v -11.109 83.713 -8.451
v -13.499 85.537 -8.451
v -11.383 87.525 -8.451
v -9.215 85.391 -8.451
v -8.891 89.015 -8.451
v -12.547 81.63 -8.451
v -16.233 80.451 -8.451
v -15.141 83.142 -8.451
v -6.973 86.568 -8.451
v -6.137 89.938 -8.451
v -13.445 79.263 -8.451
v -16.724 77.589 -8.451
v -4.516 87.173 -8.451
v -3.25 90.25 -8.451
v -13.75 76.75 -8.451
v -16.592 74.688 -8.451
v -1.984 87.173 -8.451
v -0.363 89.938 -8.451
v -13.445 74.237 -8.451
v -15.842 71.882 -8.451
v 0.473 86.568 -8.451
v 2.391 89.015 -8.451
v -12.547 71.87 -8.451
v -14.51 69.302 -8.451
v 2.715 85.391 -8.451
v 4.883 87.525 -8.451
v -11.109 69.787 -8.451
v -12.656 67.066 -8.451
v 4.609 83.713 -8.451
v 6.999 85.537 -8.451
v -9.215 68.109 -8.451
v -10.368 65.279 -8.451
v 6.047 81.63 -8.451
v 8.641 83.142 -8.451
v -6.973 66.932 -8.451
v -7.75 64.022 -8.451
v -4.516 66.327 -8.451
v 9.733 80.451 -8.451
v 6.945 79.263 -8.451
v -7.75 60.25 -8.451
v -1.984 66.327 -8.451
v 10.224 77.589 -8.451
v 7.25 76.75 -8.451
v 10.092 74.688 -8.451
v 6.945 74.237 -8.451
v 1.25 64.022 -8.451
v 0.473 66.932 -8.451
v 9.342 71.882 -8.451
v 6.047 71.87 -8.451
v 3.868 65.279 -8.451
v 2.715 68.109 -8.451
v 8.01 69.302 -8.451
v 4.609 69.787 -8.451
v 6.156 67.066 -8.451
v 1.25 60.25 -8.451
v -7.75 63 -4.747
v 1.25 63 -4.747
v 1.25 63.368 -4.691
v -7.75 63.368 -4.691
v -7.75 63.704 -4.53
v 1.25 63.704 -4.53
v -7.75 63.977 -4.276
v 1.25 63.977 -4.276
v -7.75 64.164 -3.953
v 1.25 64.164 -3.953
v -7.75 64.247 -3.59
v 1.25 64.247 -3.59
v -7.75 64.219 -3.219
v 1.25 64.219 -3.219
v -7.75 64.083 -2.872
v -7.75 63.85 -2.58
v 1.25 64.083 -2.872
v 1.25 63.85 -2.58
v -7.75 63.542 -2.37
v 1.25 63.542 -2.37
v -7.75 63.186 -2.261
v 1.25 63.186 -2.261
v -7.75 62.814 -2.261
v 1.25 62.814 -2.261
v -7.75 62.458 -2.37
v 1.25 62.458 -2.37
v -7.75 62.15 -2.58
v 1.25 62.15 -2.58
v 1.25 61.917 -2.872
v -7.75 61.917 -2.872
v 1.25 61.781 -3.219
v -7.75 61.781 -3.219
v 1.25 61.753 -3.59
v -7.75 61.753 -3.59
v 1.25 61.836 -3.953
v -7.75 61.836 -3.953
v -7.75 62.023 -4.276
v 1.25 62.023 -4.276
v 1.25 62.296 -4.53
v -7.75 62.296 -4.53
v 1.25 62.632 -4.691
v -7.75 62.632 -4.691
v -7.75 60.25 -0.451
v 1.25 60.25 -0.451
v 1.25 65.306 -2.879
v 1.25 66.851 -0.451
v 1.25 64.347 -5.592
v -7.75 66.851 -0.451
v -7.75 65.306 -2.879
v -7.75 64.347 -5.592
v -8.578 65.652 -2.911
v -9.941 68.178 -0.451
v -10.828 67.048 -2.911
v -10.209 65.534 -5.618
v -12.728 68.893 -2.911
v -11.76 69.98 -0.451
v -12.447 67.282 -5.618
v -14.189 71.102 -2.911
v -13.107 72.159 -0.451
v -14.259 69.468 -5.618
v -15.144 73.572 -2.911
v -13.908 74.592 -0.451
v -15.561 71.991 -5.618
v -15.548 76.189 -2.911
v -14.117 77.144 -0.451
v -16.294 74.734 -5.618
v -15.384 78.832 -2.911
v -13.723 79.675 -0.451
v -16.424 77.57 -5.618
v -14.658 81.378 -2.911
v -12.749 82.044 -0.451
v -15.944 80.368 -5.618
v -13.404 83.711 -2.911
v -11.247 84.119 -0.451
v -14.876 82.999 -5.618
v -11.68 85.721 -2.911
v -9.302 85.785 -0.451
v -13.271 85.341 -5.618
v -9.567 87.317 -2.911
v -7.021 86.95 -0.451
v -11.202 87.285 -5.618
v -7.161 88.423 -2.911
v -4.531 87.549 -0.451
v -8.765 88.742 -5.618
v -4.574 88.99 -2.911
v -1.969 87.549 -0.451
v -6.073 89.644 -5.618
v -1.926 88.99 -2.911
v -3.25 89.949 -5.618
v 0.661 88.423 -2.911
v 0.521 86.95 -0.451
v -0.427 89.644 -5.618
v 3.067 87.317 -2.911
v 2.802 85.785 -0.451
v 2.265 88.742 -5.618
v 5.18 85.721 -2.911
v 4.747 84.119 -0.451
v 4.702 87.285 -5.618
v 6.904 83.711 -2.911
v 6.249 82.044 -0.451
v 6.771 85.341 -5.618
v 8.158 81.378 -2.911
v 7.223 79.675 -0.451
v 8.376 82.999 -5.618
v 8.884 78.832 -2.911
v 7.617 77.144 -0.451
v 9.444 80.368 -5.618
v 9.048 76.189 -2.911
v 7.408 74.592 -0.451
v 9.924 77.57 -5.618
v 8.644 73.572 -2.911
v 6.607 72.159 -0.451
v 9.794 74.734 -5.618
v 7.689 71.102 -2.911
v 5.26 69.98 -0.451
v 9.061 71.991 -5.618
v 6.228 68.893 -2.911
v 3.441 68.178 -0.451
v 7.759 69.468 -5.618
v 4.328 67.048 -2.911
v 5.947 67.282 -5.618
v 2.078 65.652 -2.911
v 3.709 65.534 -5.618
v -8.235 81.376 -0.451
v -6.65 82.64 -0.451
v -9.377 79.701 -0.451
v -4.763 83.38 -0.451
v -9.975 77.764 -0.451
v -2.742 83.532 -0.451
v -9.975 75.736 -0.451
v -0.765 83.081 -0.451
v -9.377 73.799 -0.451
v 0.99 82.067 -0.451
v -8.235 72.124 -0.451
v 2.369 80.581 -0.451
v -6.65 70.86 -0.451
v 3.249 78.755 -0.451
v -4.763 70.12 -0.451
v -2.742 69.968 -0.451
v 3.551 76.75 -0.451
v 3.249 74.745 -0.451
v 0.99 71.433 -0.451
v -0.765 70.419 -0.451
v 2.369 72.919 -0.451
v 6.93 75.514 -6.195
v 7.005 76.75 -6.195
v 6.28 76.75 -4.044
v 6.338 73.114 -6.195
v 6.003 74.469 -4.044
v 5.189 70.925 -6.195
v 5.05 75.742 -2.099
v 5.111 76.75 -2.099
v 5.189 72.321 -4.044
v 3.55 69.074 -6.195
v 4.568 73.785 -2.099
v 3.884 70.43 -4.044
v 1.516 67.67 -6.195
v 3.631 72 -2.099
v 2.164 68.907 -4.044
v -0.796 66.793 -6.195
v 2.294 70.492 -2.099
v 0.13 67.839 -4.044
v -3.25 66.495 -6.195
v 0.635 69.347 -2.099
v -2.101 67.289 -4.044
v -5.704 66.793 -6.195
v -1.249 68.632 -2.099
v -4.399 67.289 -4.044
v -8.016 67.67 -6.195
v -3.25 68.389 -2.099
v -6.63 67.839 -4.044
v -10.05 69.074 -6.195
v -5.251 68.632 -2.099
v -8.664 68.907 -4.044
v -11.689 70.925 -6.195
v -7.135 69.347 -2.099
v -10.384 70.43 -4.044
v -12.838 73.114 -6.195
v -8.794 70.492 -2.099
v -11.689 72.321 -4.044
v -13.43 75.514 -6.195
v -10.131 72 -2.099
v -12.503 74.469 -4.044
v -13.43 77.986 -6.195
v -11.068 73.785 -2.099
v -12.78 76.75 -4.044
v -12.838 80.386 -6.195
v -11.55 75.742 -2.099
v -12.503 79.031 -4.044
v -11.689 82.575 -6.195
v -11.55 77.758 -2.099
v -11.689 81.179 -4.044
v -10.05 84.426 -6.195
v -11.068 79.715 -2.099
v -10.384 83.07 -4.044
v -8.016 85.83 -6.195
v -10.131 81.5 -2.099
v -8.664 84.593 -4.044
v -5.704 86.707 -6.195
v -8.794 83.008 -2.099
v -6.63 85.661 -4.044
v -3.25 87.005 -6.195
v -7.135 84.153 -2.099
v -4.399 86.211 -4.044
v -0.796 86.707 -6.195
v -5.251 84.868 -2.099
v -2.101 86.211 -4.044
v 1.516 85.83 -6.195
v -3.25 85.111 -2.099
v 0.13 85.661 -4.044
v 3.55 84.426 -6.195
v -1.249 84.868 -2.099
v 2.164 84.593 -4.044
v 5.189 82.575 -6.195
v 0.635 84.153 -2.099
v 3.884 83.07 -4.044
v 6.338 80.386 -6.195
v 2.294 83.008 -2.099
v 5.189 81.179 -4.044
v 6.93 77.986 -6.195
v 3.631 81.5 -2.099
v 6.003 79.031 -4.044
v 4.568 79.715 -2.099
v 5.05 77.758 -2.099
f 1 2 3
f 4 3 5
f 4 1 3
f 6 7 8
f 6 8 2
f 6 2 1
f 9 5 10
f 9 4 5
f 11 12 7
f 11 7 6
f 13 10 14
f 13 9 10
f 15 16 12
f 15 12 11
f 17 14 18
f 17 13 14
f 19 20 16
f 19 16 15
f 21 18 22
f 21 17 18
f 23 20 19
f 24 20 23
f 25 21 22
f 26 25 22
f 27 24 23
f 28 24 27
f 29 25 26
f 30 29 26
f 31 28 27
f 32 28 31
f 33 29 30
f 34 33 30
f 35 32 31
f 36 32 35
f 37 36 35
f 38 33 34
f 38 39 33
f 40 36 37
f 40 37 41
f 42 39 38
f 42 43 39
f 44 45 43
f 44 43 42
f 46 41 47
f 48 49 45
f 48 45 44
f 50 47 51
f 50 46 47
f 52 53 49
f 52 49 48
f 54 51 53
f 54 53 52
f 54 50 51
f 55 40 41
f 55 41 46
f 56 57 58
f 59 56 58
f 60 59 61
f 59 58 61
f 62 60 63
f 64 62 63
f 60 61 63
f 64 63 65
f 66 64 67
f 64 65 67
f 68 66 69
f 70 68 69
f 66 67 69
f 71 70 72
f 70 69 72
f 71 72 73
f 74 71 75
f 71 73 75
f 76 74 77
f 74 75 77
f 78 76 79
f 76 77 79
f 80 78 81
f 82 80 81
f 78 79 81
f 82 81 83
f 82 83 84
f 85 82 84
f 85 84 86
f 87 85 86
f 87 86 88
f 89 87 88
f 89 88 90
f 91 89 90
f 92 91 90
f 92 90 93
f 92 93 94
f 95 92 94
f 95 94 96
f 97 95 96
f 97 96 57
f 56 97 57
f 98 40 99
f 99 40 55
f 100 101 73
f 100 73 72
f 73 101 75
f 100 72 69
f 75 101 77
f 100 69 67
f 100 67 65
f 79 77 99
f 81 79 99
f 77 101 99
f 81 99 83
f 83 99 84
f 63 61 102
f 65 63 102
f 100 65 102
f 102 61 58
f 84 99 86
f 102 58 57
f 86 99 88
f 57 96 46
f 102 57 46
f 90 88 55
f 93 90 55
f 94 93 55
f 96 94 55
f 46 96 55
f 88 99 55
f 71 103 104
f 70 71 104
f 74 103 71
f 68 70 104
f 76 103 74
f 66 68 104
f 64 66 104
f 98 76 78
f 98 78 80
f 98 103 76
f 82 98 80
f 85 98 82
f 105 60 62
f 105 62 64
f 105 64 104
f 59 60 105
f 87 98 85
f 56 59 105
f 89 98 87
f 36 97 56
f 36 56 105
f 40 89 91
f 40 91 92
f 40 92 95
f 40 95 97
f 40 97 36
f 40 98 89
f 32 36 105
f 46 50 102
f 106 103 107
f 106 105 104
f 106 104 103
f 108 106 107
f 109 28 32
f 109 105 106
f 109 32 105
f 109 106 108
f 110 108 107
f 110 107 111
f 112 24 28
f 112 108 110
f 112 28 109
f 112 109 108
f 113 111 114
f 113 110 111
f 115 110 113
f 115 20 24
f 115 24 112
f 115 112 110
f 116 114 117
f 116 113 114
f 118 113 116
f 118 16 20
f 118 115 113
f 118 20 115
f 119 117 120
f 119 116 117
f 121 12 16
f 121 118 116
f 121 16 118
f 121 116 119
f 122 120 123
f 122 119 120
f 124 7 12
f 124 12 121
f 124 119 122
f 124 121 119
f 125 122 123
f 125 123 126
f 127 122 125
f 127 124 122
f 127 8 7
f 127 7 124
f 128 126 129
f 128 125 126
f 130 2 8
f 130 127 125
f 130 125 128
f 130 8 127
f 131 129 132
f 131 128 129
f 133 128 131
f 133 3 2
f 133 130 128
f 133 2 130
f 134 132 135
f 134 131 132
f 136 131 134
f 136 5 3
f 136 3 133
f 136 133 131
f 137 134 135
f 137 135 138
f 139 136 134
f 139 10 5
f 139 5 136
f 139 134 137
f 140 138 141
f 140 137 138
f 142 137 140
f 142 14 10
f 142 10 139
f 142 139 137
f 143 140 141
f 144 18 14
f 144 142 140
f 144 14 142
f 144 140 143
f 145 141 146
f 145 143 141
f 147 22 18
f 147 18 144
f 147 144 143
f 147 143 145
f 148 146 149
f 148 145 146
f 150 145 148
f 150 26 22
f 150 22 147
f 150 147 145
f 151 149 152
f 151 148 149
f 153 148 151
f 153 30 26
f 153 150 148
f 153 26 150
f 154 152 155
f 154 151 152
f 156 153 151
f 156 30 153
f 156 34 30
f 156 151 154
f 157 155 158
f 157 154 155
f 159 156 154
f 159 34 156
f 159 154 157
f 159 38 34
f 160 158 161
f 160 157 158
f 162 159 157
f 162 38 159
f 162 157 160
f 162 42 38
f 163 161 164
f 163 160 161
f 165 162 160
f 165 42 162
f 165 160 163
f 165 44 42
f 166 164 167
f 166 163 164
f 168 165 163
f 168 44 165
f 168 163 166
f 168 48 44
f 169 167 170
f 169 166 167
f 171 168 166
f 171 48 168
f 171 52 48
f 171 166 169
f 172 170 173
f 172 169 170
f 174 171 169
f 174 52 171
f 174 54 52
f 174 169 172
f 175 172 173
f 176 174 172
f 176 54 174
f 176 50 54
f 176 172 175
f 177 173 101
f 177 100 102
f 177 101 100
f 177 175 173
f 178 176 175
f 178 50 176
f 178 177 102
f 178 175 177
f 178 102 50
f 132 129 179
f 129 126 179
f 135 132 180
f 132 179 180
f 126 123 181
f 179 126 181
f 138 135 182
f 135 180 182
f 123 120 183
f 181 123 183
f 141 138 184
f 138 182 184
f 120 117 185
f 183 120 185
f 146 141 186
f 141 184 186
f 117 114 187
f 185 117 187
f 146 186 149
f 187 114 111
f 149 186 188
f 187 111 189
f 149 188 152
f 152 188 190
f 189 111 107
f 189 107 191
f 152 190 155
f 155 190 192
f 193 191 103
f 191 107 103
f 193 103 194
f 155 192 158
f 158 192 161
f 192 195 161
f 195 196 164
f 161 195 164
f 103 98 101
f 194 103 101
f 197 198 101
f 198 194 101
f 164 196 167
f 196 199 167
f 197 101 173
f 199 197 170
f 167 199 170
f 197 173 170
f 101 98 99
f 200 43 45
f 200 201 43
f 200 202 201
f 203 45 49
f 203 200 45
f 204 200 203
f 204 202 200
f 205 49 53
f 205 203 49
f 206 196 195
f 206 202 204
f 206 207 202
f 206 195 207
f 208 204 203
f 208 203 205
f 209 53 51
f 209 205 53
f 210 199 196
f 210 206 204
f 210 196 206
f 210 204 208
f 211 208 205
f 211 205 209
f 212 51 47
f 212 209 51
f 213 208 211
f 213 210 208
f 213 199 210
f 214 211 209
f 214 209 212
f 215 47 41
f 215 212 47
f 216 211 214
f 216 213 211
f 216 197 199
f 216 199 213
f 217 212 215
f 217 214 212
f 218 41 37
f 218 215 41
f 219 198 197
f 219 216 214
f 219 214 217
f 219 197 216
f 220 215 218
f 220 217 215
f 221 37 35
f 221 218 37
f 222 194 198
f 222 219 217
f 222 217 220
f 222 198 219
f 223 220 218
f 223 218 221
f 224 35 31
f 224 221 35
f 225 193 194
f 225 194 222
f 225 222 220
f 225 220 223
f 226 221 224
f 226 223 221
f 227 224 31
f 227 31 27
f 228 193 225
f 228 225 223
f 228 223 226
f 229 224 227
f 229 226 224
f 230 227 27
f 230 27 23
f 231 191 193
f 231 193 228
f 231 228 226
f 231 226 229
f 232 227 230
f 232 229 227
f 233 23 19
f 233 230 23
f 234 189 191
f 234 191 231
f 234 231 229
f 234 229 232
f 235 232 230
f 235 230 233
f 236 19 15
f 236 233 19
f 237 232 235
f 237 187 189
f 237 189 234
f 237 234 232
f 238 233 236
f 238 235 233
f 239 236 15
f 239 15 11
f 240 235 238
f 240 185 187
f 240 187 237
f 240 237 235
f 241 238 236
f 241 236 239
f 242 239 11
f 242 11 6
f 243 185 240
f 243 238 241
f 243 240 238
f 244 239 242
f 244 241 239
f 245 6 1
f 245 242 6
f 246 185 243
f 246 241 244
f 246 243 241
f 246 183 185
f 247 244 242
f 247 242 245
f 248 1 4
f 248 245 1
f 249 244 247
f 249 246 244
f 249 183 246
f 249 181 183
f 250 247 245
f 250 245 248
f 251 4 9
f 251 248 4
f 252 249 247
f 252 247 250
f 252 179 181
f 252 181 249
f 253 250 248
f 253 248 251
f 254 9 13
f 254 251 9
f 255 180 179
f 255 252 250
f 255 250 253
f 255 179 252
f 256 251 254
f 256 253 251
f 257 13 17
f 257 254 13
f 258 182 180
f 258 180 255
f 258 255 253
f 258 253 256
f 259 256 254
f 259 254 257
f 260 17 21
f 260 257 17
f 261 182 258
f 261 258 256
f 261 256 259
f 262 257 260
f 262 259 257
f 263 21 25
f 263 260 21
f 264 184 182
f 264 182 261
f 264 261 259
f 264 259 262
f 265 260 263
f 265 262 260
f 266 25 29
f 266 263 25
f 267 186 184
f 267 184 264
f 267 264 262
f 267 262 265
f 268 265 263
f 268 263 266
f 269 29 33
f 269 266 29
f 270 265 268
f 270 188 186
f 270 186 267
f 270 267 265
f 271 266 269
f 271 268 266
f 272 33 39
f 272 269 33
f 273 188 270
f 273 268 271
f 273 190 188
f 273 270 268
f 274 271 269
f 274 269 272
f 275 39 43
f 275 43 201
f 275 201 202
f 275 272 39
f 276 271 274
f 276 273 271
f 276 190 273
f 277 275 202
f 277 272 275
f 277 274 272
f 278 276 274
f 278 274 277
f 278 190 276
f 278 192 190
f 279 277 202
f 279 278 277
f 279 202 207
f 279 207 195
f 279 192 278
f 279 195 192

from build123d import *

# Parameters (mm, degrees)
SKETCH4_W                = 9
SKETCH4_H                = 8
BASEBOSS_DEPTH           = 3
BOSS_EXTRUDE3_REACH      = 37.383
BOSS_EXTRUDE3_END_RADIUS = 13.5
SKETCH4_5_W              = 9
SKETCH4_5_H              = 8
CUT_EXTRUDE2_REACH       = 94.415
SKETCH7_R                = 1.25


with BuildPart() as part:
    # Sketch4 → BaseBoss (new body)
    with BuildSketch(Plane(origin=(0, 60.25, 0), x_dir=(1, 0, 0), z_dir=(0, 1, 0))):
        with Locations((-3.25, 4.451253904)):
            Rectangle(SKETCH4_W, SKETCH4_H)
    extrude(amount=BASEBOSS_DEPTH)



with BuildPart() as body_2:
    # Sketch5 → CoverRevolve (revolve)
    with BuildSketch(Plane.ZY.offset(3.25), mode=Mode.PRIVATE) as coverrevolve_sk:
        with BuildLine():
            Line((-8.451253904, 63.25), (-8.451253904, 66.25))
            ThreePointArc((-8.451253904, 66.25), (-4.044311663, 67.219582376), (-0.451253904, 69.949264746))
            Line((-0.451253904, 69.949264746), (-0.451253904, 65.875718415))
            ThreePointArc((-0.451253904, 65.875718415), (-4.24131337, 63.923215496), (-8.451253904, 63.25))
        make_face()
    revolve(coverrevolve_sk.sketch.rotate(Axis((-3.25, 76.75, -0.451253904), (0, 0, -1)), 270), axis=Axis((-3.25, 76.75, -0.451253904), (0, 0, -1)))


with BuildPart() as part_1:
    add(part.part)

    add(body_2.part)  # Boss-Extrude3 merges body 2
    # Boss-Extrude3: up to this sphere (the profile starts outside it)
    boss_extrude3_end = Location((-3.25, 76.75, -8.451253904)) * Sphere(BOSS_EXTRUDE3_END_RADIUS, mode=Mode.PRIVATE)
    # Sketch4<5> → Boss-Extrude3 (add, up to the surface)
    with BuildSketch(Plane(origin=(0, 60.25, 0), x_dir=(1, 0, 0), z_dir=(0, 1, 0)), mode=Mode.PRIVATE) as boss_extrude3_sk1:
        with Locations((-3.25, 4.451253904)):
            Rectangle(SKETCH4_5_W, SKETCH4_5_H)
    boss_extrude3_tool1 = extrude(boss_extrude3_sk1.sketch, amount=BOSS_EXTRUDE3_REACH, mode=Mode.PRIVATE) - boss_extrude3_end
    add(boss_extrude3_tool1.solids().sort_by_distance((-3.25, 60.25, -4.451254))[0])

    # Sketch7 → Cut-Extrude2 (cut, up to next)
    with BuildSketch(Plane(origin=(1.25, 0, 0), x_dir=(0, 0, -1), z_dir=(1, 0, 0)), mode=Mode.PRIVATE) as cut_extrude2_sk1:
        with Locations((3.496708449, 63)):
            Circle(SKETCH7_R)
    cut_extrude2_tool1 = extrude(cut_extrude2_sk1.sketch, amount=-CUT_EXTRUDE2_REACH, mode=Mode.PRIVATE) & part_1.part
    add(cut_extrude2_tool1.solids().sort_by_distance((1.25, 63, -3.496708))[0], mode=Mode.SUBTRACT)


solid = part_1.part
